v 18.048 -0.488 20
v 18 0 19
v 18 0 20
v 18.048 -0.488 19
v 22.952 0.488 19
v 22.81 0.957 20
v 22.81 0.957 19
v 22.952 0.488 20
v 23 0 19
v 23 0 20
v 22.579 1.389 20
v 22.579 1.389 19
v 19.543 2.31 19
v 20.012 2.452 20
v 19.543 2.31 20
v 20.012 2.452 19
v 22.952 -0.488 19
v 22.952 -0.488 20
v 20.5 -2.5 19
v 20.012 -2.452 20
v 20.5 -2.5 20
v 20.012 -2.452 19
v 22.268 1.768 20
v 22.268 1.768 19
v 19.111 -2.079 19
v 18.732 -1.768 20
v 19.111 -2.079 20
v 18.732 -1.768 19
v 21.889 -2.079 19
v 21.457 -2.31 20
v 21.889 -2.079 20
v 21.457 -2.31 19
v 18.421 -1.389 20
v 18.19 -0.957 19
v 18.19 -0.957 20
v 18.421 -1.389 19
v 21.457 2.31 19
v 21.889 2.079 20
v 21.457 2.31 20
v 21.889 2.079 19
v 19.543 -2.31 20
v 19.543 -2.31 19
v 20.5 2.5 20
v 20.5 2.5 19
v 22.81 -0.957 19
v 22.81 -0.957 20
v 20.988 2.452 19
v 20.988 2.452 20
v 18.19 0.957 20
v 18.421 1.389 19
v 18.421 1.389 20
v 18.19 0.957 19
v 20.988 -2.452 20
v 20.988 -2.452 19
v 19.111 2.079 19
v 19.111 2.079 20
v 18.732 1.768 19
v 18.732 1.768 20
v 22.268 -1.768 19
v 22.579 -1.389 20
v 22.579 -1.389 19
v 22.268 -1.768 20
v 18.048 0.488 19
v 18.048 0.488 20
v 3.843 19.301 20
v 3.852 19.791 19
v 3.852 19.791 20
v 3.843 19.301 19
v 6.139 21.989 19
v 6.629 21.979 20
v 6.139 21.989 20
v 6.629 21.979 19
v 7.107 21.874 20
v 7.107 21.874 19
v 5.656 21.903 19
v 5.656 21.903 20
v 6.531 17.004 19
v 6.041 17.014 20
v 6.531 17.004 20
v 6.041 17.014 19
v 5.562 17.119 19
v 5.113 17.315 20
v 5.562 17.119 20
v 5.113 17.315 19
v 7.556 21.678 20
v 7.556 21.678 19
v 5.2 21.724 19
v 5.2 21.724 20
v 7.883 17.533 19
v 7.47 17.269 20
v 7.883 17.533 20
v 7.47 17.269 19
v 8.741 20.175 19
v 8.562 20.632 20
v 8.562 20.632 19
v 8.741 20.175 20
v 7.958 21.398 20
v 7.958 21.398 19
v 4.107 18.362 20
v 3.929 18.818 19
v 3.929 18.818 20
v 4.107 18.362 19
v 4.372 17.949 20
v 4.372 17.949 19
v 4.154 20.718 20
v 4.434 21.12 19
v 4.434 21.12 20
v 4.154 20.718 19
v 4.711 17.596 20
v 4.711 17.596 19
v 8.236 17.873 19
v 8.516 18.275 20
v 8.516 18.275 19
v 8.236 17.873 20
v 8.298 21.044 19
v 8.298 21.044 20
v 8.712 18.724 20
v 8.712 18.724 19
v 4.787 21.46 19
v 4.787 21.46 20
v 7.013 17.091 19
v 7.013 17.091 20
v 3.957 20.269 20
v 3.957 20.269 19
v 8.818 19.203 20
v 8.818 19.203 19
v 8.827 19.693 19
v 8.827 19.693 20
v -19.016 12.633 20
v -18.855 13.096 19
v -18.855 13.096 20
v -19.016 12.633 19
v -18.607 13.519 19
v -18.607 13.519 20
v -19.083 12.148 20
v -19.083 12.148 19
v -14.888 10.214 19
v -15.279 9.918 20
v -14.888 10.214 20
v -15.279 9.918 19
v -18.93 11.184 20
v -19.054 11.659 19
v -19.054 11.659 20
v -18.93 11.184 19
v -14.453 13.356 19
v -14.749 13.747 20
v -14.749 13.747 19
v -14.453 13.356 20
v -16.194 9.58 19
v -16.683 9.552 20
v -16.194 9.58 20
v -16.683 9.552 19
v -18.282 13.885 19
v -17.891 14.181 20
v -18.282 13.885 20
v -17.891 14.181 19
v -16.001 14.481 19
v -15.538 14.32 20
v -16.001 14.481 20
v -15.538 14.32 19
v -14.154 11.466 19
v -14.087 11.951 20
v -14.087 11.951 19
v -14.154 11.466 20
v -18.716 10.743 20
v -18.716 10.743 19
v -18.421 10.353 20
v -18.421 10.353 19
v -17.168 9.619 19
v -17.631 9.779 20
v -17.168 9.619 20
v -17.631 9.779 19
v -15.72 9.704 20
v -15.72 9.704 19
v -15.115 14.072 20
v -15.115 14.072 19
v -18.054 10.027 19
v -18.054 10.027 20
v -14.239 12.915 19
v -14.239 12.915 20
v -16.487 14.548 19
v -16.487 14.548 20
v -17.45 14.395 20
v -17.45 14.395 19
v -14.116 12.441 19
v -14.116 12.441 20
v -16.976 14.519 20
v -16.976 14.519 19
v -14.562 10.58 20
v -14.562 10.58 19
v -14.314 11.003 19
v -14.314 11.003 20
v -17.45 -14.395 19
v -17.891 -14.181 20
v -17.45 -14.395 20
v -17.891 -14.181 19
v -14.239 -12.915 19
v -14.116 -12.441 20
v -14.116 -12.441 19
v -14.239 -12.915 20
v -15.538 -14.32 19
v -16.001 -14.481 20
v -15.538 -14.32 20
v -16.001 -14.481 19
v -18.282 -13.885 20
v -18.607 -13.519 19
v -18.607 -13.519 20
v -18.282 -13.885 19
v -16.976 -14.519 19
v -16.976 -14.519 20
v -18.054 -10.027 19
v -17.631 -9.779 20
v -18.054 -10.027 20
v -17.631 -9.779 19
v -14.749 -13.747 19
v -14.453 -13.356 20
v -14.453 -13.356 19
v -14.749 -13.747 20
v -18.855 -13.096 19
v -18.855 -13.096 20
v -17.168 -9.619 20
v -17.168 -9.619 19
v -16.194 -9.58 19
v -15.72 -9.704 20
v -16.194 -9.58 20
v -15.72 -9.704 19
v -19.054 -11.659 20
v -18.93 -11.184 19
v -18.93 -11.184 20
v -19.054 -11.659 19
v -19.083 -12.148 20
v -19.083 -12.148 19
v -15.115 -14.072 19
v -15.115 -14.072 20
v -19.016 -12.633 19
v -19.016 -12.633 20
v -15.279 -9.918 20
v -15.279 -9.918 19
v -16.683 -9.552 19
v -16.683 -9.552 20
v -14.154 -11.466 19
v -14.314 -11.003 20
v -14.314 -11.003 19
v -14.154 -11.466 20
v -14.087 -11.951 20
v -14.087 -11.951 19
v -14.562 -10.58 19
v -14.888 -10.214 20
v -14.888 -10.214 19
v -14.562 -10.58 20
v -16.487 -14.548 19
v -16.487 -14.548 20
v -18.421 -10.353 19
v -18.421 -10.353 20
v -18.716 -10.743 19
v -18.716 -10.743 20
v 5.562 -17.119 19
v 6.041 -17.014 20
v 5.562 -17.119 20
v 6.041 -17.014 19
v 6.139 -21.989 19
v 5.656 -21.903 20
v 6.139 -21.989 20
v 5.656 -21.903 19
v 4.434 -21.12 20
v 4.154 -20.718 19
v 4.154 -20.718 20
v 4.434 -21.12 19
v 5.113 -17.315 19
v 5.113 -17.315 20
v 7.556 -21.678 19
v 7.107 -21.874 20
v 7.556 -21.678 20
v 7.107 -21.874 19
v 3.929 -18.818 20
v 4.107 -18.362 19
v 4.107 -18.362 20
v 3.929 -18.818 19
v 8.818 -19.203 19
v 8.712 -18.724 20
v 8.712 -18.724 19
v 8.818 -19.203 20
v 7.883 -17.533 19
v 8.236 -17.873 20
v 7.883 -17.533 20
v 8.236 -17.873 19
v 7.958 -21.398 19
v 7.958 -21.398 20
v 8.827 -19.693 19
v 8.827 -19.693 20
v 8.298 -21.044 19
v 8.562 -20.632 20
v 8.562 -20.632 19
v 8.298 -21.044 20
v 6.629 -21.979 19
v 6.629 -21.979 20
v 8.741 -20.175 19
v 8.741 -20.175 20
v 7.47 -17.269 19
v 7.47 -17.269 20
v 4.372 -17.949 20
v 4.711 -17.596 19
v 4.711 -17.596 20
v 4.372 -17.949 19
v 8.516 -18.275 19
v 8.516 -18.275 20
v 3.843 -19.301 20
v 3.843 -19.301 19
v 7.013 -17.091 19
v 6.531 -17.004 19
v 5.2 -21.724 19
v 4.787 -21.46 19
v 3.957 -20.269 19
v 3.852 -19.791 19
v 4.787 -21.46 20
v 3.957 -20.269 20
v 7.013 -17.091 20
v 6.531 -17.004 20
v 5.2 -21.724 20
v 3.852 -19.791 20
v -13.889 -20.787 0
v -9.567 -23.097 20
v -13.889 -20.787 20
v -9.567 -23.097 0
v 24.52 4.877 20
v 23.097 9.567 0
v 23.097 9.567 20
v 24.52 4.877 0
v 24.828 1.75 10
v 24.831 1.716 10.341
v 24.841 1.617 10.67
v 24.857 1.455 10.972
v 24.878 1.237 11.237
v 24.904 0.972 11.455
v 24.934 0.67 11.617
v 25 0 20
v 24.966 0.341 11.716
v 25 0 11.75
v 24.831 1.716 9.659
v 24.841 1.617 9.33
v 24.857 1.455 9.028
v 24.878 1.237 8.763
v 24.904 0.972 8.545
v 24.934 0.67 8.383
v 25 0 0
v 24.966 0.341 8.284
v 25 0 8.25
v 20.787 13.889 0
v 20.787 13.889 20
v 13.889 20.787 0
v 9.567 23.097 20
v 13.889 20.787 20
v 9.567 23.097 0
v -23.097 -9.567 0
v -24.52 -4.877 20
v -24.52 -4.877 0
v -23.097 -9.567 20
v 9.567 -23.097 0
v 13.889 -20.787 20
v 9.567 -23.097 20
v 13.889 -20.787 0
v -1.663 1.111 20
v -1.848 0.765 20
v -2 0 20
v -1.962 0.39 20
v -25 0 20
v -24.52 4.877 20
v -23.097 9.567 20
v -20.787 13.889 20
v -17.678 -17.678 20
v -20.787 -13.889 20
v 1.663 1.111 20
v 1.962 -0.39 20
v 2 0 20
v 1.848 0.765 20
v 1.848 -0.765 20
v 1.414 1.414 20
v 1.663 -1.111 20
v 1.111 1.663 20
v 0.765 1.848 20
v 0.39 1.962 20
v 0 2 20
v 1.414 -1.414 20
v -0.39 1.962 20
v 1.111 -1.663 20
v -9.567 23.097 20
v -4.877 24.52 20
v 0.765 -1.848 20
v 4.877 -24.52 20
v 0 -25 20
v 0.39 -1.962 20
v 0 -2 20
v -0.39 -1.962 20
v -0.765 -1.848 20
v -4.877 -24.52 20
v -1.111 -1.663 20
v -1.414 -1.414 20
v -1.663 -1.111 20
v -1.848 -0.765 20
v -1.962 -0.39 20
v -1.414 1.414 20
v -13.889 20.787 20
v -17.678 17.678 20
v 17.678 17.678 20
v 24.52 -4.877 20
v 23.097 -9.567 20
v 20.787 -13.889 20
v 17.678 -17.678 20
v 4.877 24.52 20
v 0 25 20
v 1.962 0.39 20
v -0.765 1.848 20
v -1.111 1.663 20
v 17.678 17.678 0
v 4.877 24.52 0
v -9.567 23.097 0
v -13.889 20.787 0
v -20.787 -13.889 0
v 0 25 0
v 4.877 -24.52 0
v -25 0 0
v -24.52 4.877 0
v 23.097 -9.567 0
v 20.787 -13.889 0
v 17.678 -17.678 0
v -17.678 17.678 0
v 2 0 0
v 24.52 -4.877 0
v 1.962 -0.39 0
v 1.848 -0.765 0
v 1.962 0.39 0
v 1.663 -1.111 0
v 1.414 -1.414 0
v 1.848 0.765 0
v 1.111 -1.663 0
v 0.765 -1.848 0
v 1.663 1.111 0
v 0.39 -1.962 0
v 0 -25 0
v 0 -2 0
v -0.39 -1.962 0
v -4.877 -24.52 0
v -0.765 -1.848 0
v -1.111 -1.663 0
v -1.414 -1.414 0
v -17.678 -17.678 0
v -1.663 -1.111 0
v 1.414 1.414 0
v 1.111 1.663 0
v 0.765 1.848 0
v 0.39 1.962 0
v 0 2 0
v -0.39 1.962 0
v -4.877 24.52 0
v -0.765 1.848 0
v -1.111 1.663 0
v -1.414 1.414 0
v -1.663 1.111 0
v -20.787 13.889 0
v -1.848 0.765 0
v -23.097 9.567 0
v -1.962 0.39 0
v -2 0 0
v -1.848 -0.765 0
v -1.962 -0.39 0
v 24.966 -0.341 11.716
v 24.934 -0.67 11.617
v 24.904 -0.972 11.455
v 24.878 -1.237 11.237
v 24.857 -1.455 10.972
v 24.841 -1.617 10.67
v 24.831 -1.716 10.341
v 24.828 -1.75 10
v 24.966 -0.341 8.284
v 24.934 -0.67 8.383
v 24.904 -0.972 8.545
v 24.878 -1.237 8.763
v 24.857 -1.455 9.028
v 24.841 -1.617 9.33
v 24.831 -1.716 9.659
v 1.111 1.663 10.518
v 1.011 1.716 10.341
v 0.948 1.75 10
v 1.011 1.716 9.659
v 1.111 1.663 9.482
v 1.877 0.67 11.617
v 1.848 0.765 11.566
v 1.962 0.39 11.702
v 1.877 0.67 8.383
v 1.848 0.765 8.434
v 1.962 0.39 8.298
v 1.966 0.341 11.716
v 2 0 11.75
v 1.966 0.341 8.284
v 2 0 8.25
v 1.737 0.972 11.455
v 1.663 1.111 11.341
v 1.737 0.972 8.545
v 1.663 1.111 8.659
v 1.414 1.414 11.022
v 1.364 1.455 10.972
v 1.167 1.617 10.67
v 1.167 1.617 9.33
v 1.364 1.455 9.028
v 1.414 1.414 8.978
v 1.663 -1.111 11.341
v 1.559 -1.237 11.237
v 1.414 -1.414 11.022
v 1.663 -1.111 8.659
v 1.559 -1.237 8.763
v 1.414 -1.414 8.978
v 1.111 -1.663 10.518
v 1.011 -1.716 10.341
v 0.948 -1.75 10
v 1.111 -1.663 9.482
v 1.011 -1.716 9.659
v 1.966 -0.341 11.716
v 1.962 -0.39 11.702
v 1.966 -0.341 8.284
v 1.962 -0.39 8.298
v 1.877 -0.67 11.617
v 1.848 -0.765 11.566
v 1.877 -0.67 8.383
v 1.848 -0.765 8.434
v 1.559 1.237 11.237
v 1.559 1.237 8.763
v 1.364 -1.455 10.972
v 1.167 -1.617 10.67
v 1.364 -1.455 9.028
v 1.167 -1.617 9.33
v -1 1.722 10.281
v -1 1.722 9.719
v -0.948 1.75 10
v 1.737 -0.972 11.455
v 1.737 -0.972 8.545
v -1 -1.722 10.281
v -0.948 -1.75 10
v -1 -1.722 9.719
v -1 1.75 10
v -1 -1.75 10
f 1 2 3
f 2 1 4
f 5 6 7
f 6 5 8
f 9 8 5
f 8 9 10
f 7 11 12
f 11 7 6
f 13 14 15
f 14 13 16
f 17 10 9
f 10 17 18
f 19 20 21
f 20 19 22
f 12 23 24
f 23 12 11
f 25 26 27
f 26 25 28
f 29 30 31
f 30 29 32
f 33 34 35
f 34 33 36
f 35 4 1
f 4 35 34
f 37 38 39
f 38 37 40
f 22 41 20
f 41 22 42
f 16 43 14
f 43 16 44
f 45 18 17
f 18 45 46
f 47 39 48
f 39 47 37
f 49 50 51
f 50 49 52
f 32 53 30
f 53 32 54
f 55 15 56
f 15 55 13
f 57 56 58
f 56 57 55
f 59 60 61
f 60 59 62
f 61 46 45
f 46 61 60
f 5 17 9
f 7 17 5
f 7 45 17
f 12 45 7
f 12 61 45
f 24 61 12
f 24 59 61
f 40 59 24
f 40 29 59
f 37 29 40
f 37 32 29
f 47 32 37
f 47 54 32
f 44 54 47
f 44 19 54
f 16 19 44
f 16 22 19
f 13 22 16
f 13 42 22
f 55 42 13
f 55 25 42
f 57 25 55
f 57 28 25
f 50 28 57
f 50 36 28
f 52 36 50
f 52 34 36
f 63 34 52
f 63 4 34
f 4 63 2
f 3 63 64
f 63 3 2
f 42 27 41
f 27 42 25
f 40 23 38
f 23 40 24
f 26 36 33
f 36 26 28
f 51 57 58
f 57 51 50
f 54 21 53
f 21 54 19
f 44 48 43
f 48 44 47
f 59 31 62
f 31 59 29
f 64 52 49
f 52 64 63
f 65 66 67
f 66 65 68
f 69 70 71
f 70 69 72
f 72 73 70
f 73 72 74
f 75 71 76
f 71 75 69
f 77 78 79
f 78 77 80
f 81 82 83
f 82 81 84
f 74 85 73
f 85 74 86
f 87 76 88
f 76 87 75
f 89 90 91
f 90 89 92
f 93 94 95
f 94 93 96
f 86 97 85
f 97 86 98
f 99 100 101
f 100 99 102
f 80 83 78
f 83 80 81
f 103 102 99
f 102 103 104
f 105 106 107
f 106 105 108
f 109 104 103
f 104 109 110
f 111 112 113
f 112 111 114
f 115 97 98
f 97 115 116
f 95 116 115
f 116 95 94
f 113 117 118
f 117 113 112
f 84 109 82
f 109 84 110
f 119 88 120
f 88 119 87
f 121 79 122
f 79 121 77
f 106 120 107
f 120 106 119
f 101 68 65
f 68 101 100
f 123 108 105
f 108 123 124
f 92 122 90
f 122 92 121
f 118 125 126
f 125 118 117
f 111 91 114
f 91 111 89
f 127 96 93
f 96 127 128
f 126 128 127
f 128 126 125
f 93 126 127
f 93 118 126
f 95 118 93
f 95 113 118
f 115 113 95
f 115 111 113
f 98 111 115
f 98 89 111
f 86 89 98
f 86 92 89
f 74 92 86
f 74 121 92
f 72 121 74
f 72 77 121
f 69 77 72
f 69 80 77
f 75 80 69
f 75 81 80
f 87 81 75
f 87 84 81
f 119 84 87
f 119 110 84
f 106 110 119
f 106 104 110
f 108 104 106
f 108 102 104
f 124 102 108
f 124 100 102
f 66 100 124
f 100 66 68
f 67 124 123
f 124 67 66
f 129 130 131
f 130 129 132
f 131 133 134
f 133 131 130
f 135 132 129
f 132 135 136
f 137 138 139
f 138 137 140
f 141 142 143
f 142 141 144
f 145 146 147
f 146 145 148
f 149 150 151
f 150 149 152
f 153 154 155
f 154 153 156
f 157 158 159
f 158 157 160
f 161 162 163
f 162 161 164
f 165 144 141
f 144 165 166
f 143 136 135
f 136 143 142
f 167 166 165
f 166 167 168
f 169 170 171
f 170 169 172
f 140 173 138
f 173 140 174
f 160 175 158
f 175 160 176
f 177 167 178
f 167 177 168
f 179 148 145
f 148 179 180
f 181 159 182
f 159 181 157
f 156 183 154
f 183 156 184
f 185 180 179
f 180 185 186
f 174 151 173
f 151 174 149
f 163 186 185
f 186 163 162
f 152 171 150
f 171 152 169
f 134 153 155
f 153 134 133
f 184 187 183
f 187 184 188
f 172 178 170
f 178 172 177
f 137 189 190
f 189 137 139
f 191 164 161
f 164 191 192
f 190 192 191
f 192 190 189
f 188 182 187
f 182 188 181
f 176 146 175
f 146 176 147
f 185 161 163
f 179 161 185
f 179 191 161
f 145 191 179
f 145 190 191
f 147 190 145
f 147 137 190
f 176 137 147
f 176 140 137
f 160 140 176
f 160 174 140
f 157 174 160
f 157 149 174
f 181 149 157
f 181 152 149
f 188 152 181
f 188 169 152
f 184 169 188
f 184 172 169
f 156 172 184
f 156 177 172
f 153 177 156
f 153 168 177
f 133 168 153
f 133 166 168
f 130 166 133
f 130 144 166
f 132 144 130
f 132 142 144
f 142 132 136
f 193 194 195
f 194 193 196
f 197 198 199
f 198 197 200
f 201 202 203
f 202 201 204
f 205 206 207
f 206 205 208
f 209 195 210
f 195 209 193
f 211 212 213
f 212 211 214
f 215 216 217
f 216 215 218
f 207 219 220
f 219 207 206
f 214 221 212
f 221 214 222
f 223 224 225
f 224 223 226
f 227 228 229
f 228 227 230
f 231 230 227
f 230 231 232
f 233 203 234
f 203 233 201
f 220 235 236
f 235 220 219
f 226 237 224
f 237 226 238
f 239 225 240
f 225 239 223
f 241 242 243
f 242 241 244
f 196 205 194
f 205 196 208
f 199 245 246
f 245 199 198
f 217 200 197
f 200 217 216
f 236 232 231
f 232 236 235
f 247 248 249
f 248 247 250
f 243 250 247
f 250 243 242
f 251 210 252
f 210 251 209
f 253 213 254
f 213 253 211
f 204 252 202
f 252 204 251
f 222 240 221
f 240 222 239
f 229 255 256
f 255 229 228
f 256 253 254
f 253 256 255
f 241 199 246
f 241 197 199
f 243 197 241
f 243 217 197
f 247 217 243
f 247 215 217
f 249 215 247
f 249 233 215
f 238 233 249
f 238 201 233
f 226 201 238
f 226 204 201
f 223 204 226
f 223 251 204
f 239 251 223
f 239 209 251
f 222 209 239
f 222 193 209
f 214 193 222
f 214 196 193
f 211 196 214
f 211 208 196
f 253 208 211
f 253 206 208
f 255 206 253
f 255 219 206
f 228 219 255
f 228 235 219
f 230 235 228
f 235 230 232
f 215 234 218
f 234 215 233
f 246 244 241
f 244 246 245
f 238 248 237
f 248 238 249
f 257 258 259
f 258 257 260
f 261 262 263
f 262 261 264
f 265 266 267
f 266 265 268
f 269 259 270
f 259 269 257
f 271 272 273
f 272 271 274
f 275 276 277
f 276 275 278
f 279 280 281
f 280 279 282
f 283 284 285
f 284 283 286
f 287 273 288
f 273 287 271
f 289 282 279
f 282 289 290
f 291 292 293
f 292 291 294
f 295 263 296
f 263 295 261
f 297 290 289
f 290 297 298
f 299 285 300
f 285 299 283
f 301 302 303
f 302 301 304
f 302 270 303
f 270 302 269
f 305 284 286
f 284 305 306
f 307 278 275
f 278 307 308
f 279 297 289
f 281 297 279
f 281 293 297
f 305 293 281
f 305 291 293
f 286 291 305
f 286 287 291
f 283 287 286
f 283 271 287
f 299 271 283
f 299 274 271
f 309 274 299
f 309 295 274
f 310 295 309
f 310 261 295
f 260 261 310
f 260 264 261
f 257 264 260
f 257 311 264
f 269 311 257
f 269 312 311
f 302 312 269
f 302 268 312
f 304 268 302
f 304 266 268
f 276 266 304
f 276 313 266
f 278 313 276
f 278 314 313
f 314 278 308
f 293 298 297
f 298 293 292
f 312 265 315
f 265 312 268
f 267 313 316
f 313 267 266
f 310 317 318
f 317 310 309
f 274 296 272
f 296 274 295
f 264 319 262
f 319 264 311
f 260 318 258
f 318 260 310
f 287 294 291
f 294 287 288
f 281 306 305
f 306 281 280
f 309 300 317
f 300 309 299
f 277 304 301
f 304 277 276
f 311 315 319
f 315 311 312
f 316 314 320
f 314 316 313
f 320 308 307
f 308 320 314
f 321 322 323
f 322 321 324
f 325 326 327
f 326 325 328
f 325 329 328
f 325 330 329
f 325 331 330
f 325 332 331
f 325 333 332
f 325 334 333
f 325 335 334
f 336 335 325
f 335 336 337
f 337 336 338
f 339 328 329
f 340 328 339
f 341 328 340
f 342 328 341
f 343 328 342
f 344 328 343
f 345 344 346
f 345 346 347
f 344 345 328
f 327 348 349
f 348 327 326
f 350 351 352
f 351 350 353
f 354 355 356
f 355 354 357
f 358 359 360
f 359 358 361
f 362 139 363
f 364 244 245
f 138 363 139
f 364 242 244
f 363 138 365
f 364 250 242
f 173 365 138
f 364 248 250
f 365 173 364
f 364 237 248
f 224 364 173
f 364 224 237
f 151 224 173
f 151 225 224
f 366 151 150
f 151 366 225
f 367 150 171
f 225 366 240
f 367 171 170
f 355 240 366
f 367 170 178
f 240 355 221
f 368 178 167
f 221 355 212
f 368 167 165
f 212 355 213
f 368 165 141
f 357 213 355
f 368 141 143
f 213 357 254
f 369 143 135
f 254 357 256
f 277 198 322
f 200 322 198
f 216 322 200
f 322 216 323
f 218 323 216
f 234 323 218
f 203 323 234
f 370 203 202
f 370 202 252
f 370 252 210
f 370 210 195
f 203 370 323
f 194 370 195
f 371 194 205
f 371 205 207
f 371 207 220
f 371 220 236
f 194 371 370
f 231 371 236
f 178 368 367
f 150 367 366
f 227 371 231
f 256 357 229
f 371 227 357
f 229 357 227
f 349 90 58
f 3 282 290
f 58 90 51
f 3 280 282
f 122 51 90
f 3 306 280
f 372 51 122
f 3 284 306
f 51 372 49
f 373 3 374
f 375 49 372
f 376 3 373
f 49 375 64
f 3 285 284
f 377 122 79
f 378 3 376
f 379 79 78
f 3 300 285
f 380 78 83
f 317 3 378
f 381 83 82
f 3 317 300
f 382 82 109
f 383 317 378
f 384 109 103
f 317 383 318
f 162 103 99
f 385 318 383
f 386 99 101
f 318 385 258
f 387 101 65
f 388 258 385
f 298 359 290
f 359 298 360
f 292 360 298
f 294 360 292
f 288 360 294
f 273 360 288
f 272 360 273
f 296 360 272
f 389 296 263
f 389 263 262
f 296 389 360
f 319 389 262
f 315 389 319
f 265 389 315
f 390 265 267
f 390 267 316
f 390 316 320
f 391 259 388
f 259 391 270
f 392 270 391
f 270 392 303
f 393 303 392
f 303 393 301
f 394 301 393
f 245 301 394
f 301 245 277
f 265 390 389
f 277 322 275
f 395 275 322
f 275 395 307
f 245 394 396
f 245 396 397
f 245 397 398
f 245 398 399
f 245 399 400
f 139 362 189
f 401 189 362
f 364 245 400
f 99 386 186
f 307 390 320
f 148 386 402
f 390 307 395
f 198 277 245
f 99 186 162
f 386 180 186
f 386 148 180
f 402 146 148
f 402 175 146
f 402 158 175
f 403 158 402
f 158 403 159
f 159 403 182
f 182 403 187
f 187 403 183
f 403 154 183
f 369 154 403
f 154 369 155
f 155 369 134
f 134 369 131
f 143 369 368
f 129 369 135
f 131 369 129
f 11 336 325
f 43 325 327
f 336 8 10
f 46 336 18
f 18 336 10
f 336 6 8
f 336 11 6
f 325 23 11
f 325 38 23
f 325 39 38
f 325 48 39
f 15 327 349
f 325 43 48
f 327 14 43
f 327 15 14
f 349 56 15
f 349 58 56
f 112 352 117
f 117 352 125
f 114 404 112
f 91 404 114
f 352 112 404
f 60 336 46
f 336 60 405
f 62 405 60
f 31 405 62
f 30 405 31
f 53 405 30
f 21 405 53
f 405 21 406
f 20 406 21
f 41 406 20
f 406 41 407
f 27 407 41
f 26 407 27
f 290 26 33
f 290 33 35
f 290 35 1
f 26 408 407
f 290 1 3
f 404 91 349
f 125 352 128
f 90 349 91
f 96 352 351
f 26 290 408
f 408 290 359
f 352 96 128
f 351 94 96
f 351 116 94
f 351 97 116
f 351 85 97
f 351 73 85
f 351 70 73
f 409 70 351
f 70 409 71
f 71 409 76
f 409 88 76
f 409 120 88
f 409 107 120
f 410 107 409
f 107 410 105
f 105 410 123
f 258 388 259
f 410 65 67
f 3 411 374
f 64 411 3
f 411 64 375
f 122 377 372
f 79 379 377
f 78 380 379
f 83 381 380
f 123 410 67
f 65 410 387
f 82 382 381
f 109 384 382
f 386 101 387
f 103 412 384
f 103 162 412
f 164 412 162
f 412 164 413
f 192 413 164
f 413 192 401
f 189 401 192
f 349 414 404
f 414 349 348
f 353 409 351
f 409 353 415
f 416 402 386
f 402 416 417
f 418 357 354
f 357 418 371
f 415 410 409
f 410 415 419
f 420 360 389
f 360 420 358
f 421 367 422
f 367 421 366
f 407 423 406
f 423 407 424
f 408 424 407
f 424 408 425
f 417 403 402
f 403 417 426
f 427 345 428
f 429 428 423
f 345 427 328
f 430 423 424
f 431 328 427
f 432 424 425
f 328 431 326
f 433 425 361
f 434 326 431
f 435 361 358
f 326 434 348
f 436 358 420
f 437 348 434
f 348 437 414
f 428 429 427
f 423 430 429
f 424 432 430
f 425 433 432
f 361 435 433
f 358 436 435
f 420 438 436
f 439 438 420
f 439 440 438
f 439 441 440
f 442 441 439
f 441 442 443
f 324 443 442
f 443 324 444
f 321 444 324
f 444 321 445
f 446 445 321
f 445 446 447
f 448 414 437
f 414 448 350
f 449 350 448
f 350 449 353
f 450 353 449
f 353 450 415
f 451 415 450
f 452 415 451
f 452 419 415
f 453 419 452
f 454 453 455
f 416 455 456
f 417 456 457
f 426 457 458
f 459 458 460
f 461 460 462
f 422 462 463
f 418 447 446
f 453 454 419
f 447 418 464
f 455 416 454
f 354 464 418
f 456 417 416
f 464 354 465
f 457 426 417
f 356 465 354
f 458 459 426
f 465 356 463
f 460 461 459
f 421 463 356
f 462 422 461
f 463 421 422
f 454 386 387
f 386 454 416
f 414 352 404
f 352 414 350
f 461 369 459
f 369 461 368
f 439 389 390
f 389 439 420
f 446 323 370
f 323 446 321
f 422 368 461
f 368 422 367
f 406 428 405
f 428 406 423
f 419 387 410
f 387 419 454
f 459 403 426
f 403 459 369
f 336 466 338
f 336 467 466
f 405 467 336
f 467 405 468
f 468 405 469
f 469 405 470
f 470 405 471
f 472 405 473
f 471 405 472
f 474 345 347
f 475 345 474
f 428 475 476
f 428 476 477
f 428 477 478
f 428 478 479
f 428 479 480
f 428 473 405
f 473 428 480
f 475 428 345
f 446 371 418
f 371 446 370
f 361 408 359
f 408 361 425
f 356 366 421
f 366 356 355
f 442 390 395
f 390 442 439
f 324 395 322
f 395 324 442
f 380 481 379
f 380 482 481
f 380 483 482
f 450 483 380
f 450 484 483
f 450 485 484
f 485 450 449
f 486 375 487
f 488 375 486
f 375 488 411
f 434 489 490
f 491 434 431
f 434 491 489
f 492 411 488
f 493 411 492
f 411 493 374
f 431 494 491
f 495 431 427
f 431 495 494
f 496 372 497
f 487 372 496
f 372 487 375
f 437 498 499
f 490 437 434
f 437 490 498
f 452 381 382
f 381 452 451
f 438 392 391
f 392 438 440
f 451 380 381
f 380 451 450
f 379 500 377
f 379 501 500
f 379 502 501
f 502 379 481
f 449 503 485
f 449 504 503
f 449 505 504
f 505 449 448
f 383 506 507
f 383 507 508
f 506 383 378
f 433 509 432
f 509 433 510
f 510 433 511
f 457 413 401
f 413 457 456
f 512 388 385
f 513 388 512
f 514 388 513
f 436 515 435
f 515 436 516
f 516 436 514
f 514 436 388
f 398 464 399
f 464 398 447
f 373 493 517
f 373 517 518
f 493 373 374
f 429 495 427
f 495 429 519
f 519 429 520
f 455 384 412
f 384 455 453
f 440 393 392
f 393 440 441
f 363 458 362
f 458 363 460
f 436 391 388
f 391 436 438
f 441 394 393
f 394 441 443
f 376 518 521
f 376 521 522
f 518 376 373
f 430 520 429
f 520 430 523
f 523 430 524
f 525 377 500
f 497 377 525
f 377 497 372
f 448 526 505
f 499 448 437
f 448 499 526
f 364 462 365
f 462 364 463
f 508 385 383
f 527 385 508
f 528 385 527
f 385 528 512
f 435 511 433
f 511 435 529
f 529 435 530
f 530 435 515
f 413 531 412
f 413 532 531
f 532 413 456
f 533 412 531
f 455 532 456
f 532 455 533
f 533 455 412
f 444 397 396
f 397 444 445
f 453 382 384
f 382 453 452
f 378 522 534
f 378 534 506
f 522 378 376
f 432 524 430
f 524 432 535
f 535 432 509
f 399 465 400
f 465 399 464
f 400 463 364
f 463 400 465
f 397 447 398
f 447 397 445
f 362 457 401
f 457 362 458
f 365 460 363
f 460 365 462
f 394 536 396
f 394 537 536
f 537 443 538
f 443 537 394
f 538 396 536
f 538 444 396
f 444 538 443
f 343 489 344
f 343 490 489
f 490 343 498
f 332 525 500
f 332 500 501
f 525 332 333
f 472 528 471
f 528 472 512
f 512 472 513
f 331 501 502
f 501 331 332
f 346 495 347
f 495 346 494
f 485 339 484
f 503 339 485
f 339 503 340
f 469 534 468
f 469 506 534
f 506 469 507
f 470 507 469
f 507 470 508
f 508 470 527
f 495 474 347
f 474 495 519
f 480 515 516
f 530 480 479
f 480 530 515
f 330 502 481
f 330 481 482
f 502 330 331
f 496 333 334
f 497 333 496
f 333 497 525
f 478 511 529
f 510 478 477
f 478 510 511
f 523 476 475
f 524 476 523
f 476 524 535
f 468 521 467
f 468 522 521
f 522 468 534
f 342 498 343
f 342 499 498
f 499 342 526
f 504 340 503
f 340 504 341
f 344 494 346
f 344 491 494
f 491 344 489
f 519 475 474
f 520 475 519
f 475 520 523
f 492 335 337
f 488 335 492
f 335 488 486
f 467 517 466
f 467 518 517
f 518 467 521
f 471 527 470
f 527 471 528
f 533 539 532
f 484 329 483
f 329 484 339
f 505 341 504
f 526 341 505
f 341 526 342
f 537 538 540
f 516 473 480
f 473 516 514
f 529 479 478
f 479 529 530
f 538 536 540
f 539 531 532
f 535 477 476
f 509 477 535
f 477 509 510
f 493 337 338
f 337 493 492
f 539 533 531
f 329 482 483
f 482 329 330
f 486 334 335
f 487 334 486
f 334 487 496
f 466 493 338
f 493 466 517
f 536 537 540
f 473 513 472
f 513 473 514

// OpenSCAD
$fn = 32;

// ----------------------------------------------------------------------
// Control knob: dimpled knob
// ----------------------------------------------------------------------

// --- parameters (mm) ---
dimp_d = 5;               // finger dimple diameter
n_dimp = 5;               // number of dimples
dimp_r = 20.5;            // dimple ring radius
knob_d = 50;              // knob body diameter
knob_h = 20;              // knob body height
bore_d = 4;               // shaft bore diameter
set_d = 3.5;              // set screw bore diameter

dimp_step = 360 / n_dimp;  // dimple angular step

difference() {
  cylinder(h = knob_h, d = knob_d);
  translate([0, 0, -1]) cylinder(h = knob_h + 2, d = bore_d);
  translate([-1, 0, knob_h / 2]) rotate([0, 90, 0])
    cylinder(h = knob_d / 2 + bore_d / 2 + 2, d = set_d);  for (i = [0 : n_dimp - 1])
    rotate([0, 0, i * dimp_step])
      translate([dimp_r, 0, knob_h - 1])
        cylinder(h = 2, d = dimp_d);
}
